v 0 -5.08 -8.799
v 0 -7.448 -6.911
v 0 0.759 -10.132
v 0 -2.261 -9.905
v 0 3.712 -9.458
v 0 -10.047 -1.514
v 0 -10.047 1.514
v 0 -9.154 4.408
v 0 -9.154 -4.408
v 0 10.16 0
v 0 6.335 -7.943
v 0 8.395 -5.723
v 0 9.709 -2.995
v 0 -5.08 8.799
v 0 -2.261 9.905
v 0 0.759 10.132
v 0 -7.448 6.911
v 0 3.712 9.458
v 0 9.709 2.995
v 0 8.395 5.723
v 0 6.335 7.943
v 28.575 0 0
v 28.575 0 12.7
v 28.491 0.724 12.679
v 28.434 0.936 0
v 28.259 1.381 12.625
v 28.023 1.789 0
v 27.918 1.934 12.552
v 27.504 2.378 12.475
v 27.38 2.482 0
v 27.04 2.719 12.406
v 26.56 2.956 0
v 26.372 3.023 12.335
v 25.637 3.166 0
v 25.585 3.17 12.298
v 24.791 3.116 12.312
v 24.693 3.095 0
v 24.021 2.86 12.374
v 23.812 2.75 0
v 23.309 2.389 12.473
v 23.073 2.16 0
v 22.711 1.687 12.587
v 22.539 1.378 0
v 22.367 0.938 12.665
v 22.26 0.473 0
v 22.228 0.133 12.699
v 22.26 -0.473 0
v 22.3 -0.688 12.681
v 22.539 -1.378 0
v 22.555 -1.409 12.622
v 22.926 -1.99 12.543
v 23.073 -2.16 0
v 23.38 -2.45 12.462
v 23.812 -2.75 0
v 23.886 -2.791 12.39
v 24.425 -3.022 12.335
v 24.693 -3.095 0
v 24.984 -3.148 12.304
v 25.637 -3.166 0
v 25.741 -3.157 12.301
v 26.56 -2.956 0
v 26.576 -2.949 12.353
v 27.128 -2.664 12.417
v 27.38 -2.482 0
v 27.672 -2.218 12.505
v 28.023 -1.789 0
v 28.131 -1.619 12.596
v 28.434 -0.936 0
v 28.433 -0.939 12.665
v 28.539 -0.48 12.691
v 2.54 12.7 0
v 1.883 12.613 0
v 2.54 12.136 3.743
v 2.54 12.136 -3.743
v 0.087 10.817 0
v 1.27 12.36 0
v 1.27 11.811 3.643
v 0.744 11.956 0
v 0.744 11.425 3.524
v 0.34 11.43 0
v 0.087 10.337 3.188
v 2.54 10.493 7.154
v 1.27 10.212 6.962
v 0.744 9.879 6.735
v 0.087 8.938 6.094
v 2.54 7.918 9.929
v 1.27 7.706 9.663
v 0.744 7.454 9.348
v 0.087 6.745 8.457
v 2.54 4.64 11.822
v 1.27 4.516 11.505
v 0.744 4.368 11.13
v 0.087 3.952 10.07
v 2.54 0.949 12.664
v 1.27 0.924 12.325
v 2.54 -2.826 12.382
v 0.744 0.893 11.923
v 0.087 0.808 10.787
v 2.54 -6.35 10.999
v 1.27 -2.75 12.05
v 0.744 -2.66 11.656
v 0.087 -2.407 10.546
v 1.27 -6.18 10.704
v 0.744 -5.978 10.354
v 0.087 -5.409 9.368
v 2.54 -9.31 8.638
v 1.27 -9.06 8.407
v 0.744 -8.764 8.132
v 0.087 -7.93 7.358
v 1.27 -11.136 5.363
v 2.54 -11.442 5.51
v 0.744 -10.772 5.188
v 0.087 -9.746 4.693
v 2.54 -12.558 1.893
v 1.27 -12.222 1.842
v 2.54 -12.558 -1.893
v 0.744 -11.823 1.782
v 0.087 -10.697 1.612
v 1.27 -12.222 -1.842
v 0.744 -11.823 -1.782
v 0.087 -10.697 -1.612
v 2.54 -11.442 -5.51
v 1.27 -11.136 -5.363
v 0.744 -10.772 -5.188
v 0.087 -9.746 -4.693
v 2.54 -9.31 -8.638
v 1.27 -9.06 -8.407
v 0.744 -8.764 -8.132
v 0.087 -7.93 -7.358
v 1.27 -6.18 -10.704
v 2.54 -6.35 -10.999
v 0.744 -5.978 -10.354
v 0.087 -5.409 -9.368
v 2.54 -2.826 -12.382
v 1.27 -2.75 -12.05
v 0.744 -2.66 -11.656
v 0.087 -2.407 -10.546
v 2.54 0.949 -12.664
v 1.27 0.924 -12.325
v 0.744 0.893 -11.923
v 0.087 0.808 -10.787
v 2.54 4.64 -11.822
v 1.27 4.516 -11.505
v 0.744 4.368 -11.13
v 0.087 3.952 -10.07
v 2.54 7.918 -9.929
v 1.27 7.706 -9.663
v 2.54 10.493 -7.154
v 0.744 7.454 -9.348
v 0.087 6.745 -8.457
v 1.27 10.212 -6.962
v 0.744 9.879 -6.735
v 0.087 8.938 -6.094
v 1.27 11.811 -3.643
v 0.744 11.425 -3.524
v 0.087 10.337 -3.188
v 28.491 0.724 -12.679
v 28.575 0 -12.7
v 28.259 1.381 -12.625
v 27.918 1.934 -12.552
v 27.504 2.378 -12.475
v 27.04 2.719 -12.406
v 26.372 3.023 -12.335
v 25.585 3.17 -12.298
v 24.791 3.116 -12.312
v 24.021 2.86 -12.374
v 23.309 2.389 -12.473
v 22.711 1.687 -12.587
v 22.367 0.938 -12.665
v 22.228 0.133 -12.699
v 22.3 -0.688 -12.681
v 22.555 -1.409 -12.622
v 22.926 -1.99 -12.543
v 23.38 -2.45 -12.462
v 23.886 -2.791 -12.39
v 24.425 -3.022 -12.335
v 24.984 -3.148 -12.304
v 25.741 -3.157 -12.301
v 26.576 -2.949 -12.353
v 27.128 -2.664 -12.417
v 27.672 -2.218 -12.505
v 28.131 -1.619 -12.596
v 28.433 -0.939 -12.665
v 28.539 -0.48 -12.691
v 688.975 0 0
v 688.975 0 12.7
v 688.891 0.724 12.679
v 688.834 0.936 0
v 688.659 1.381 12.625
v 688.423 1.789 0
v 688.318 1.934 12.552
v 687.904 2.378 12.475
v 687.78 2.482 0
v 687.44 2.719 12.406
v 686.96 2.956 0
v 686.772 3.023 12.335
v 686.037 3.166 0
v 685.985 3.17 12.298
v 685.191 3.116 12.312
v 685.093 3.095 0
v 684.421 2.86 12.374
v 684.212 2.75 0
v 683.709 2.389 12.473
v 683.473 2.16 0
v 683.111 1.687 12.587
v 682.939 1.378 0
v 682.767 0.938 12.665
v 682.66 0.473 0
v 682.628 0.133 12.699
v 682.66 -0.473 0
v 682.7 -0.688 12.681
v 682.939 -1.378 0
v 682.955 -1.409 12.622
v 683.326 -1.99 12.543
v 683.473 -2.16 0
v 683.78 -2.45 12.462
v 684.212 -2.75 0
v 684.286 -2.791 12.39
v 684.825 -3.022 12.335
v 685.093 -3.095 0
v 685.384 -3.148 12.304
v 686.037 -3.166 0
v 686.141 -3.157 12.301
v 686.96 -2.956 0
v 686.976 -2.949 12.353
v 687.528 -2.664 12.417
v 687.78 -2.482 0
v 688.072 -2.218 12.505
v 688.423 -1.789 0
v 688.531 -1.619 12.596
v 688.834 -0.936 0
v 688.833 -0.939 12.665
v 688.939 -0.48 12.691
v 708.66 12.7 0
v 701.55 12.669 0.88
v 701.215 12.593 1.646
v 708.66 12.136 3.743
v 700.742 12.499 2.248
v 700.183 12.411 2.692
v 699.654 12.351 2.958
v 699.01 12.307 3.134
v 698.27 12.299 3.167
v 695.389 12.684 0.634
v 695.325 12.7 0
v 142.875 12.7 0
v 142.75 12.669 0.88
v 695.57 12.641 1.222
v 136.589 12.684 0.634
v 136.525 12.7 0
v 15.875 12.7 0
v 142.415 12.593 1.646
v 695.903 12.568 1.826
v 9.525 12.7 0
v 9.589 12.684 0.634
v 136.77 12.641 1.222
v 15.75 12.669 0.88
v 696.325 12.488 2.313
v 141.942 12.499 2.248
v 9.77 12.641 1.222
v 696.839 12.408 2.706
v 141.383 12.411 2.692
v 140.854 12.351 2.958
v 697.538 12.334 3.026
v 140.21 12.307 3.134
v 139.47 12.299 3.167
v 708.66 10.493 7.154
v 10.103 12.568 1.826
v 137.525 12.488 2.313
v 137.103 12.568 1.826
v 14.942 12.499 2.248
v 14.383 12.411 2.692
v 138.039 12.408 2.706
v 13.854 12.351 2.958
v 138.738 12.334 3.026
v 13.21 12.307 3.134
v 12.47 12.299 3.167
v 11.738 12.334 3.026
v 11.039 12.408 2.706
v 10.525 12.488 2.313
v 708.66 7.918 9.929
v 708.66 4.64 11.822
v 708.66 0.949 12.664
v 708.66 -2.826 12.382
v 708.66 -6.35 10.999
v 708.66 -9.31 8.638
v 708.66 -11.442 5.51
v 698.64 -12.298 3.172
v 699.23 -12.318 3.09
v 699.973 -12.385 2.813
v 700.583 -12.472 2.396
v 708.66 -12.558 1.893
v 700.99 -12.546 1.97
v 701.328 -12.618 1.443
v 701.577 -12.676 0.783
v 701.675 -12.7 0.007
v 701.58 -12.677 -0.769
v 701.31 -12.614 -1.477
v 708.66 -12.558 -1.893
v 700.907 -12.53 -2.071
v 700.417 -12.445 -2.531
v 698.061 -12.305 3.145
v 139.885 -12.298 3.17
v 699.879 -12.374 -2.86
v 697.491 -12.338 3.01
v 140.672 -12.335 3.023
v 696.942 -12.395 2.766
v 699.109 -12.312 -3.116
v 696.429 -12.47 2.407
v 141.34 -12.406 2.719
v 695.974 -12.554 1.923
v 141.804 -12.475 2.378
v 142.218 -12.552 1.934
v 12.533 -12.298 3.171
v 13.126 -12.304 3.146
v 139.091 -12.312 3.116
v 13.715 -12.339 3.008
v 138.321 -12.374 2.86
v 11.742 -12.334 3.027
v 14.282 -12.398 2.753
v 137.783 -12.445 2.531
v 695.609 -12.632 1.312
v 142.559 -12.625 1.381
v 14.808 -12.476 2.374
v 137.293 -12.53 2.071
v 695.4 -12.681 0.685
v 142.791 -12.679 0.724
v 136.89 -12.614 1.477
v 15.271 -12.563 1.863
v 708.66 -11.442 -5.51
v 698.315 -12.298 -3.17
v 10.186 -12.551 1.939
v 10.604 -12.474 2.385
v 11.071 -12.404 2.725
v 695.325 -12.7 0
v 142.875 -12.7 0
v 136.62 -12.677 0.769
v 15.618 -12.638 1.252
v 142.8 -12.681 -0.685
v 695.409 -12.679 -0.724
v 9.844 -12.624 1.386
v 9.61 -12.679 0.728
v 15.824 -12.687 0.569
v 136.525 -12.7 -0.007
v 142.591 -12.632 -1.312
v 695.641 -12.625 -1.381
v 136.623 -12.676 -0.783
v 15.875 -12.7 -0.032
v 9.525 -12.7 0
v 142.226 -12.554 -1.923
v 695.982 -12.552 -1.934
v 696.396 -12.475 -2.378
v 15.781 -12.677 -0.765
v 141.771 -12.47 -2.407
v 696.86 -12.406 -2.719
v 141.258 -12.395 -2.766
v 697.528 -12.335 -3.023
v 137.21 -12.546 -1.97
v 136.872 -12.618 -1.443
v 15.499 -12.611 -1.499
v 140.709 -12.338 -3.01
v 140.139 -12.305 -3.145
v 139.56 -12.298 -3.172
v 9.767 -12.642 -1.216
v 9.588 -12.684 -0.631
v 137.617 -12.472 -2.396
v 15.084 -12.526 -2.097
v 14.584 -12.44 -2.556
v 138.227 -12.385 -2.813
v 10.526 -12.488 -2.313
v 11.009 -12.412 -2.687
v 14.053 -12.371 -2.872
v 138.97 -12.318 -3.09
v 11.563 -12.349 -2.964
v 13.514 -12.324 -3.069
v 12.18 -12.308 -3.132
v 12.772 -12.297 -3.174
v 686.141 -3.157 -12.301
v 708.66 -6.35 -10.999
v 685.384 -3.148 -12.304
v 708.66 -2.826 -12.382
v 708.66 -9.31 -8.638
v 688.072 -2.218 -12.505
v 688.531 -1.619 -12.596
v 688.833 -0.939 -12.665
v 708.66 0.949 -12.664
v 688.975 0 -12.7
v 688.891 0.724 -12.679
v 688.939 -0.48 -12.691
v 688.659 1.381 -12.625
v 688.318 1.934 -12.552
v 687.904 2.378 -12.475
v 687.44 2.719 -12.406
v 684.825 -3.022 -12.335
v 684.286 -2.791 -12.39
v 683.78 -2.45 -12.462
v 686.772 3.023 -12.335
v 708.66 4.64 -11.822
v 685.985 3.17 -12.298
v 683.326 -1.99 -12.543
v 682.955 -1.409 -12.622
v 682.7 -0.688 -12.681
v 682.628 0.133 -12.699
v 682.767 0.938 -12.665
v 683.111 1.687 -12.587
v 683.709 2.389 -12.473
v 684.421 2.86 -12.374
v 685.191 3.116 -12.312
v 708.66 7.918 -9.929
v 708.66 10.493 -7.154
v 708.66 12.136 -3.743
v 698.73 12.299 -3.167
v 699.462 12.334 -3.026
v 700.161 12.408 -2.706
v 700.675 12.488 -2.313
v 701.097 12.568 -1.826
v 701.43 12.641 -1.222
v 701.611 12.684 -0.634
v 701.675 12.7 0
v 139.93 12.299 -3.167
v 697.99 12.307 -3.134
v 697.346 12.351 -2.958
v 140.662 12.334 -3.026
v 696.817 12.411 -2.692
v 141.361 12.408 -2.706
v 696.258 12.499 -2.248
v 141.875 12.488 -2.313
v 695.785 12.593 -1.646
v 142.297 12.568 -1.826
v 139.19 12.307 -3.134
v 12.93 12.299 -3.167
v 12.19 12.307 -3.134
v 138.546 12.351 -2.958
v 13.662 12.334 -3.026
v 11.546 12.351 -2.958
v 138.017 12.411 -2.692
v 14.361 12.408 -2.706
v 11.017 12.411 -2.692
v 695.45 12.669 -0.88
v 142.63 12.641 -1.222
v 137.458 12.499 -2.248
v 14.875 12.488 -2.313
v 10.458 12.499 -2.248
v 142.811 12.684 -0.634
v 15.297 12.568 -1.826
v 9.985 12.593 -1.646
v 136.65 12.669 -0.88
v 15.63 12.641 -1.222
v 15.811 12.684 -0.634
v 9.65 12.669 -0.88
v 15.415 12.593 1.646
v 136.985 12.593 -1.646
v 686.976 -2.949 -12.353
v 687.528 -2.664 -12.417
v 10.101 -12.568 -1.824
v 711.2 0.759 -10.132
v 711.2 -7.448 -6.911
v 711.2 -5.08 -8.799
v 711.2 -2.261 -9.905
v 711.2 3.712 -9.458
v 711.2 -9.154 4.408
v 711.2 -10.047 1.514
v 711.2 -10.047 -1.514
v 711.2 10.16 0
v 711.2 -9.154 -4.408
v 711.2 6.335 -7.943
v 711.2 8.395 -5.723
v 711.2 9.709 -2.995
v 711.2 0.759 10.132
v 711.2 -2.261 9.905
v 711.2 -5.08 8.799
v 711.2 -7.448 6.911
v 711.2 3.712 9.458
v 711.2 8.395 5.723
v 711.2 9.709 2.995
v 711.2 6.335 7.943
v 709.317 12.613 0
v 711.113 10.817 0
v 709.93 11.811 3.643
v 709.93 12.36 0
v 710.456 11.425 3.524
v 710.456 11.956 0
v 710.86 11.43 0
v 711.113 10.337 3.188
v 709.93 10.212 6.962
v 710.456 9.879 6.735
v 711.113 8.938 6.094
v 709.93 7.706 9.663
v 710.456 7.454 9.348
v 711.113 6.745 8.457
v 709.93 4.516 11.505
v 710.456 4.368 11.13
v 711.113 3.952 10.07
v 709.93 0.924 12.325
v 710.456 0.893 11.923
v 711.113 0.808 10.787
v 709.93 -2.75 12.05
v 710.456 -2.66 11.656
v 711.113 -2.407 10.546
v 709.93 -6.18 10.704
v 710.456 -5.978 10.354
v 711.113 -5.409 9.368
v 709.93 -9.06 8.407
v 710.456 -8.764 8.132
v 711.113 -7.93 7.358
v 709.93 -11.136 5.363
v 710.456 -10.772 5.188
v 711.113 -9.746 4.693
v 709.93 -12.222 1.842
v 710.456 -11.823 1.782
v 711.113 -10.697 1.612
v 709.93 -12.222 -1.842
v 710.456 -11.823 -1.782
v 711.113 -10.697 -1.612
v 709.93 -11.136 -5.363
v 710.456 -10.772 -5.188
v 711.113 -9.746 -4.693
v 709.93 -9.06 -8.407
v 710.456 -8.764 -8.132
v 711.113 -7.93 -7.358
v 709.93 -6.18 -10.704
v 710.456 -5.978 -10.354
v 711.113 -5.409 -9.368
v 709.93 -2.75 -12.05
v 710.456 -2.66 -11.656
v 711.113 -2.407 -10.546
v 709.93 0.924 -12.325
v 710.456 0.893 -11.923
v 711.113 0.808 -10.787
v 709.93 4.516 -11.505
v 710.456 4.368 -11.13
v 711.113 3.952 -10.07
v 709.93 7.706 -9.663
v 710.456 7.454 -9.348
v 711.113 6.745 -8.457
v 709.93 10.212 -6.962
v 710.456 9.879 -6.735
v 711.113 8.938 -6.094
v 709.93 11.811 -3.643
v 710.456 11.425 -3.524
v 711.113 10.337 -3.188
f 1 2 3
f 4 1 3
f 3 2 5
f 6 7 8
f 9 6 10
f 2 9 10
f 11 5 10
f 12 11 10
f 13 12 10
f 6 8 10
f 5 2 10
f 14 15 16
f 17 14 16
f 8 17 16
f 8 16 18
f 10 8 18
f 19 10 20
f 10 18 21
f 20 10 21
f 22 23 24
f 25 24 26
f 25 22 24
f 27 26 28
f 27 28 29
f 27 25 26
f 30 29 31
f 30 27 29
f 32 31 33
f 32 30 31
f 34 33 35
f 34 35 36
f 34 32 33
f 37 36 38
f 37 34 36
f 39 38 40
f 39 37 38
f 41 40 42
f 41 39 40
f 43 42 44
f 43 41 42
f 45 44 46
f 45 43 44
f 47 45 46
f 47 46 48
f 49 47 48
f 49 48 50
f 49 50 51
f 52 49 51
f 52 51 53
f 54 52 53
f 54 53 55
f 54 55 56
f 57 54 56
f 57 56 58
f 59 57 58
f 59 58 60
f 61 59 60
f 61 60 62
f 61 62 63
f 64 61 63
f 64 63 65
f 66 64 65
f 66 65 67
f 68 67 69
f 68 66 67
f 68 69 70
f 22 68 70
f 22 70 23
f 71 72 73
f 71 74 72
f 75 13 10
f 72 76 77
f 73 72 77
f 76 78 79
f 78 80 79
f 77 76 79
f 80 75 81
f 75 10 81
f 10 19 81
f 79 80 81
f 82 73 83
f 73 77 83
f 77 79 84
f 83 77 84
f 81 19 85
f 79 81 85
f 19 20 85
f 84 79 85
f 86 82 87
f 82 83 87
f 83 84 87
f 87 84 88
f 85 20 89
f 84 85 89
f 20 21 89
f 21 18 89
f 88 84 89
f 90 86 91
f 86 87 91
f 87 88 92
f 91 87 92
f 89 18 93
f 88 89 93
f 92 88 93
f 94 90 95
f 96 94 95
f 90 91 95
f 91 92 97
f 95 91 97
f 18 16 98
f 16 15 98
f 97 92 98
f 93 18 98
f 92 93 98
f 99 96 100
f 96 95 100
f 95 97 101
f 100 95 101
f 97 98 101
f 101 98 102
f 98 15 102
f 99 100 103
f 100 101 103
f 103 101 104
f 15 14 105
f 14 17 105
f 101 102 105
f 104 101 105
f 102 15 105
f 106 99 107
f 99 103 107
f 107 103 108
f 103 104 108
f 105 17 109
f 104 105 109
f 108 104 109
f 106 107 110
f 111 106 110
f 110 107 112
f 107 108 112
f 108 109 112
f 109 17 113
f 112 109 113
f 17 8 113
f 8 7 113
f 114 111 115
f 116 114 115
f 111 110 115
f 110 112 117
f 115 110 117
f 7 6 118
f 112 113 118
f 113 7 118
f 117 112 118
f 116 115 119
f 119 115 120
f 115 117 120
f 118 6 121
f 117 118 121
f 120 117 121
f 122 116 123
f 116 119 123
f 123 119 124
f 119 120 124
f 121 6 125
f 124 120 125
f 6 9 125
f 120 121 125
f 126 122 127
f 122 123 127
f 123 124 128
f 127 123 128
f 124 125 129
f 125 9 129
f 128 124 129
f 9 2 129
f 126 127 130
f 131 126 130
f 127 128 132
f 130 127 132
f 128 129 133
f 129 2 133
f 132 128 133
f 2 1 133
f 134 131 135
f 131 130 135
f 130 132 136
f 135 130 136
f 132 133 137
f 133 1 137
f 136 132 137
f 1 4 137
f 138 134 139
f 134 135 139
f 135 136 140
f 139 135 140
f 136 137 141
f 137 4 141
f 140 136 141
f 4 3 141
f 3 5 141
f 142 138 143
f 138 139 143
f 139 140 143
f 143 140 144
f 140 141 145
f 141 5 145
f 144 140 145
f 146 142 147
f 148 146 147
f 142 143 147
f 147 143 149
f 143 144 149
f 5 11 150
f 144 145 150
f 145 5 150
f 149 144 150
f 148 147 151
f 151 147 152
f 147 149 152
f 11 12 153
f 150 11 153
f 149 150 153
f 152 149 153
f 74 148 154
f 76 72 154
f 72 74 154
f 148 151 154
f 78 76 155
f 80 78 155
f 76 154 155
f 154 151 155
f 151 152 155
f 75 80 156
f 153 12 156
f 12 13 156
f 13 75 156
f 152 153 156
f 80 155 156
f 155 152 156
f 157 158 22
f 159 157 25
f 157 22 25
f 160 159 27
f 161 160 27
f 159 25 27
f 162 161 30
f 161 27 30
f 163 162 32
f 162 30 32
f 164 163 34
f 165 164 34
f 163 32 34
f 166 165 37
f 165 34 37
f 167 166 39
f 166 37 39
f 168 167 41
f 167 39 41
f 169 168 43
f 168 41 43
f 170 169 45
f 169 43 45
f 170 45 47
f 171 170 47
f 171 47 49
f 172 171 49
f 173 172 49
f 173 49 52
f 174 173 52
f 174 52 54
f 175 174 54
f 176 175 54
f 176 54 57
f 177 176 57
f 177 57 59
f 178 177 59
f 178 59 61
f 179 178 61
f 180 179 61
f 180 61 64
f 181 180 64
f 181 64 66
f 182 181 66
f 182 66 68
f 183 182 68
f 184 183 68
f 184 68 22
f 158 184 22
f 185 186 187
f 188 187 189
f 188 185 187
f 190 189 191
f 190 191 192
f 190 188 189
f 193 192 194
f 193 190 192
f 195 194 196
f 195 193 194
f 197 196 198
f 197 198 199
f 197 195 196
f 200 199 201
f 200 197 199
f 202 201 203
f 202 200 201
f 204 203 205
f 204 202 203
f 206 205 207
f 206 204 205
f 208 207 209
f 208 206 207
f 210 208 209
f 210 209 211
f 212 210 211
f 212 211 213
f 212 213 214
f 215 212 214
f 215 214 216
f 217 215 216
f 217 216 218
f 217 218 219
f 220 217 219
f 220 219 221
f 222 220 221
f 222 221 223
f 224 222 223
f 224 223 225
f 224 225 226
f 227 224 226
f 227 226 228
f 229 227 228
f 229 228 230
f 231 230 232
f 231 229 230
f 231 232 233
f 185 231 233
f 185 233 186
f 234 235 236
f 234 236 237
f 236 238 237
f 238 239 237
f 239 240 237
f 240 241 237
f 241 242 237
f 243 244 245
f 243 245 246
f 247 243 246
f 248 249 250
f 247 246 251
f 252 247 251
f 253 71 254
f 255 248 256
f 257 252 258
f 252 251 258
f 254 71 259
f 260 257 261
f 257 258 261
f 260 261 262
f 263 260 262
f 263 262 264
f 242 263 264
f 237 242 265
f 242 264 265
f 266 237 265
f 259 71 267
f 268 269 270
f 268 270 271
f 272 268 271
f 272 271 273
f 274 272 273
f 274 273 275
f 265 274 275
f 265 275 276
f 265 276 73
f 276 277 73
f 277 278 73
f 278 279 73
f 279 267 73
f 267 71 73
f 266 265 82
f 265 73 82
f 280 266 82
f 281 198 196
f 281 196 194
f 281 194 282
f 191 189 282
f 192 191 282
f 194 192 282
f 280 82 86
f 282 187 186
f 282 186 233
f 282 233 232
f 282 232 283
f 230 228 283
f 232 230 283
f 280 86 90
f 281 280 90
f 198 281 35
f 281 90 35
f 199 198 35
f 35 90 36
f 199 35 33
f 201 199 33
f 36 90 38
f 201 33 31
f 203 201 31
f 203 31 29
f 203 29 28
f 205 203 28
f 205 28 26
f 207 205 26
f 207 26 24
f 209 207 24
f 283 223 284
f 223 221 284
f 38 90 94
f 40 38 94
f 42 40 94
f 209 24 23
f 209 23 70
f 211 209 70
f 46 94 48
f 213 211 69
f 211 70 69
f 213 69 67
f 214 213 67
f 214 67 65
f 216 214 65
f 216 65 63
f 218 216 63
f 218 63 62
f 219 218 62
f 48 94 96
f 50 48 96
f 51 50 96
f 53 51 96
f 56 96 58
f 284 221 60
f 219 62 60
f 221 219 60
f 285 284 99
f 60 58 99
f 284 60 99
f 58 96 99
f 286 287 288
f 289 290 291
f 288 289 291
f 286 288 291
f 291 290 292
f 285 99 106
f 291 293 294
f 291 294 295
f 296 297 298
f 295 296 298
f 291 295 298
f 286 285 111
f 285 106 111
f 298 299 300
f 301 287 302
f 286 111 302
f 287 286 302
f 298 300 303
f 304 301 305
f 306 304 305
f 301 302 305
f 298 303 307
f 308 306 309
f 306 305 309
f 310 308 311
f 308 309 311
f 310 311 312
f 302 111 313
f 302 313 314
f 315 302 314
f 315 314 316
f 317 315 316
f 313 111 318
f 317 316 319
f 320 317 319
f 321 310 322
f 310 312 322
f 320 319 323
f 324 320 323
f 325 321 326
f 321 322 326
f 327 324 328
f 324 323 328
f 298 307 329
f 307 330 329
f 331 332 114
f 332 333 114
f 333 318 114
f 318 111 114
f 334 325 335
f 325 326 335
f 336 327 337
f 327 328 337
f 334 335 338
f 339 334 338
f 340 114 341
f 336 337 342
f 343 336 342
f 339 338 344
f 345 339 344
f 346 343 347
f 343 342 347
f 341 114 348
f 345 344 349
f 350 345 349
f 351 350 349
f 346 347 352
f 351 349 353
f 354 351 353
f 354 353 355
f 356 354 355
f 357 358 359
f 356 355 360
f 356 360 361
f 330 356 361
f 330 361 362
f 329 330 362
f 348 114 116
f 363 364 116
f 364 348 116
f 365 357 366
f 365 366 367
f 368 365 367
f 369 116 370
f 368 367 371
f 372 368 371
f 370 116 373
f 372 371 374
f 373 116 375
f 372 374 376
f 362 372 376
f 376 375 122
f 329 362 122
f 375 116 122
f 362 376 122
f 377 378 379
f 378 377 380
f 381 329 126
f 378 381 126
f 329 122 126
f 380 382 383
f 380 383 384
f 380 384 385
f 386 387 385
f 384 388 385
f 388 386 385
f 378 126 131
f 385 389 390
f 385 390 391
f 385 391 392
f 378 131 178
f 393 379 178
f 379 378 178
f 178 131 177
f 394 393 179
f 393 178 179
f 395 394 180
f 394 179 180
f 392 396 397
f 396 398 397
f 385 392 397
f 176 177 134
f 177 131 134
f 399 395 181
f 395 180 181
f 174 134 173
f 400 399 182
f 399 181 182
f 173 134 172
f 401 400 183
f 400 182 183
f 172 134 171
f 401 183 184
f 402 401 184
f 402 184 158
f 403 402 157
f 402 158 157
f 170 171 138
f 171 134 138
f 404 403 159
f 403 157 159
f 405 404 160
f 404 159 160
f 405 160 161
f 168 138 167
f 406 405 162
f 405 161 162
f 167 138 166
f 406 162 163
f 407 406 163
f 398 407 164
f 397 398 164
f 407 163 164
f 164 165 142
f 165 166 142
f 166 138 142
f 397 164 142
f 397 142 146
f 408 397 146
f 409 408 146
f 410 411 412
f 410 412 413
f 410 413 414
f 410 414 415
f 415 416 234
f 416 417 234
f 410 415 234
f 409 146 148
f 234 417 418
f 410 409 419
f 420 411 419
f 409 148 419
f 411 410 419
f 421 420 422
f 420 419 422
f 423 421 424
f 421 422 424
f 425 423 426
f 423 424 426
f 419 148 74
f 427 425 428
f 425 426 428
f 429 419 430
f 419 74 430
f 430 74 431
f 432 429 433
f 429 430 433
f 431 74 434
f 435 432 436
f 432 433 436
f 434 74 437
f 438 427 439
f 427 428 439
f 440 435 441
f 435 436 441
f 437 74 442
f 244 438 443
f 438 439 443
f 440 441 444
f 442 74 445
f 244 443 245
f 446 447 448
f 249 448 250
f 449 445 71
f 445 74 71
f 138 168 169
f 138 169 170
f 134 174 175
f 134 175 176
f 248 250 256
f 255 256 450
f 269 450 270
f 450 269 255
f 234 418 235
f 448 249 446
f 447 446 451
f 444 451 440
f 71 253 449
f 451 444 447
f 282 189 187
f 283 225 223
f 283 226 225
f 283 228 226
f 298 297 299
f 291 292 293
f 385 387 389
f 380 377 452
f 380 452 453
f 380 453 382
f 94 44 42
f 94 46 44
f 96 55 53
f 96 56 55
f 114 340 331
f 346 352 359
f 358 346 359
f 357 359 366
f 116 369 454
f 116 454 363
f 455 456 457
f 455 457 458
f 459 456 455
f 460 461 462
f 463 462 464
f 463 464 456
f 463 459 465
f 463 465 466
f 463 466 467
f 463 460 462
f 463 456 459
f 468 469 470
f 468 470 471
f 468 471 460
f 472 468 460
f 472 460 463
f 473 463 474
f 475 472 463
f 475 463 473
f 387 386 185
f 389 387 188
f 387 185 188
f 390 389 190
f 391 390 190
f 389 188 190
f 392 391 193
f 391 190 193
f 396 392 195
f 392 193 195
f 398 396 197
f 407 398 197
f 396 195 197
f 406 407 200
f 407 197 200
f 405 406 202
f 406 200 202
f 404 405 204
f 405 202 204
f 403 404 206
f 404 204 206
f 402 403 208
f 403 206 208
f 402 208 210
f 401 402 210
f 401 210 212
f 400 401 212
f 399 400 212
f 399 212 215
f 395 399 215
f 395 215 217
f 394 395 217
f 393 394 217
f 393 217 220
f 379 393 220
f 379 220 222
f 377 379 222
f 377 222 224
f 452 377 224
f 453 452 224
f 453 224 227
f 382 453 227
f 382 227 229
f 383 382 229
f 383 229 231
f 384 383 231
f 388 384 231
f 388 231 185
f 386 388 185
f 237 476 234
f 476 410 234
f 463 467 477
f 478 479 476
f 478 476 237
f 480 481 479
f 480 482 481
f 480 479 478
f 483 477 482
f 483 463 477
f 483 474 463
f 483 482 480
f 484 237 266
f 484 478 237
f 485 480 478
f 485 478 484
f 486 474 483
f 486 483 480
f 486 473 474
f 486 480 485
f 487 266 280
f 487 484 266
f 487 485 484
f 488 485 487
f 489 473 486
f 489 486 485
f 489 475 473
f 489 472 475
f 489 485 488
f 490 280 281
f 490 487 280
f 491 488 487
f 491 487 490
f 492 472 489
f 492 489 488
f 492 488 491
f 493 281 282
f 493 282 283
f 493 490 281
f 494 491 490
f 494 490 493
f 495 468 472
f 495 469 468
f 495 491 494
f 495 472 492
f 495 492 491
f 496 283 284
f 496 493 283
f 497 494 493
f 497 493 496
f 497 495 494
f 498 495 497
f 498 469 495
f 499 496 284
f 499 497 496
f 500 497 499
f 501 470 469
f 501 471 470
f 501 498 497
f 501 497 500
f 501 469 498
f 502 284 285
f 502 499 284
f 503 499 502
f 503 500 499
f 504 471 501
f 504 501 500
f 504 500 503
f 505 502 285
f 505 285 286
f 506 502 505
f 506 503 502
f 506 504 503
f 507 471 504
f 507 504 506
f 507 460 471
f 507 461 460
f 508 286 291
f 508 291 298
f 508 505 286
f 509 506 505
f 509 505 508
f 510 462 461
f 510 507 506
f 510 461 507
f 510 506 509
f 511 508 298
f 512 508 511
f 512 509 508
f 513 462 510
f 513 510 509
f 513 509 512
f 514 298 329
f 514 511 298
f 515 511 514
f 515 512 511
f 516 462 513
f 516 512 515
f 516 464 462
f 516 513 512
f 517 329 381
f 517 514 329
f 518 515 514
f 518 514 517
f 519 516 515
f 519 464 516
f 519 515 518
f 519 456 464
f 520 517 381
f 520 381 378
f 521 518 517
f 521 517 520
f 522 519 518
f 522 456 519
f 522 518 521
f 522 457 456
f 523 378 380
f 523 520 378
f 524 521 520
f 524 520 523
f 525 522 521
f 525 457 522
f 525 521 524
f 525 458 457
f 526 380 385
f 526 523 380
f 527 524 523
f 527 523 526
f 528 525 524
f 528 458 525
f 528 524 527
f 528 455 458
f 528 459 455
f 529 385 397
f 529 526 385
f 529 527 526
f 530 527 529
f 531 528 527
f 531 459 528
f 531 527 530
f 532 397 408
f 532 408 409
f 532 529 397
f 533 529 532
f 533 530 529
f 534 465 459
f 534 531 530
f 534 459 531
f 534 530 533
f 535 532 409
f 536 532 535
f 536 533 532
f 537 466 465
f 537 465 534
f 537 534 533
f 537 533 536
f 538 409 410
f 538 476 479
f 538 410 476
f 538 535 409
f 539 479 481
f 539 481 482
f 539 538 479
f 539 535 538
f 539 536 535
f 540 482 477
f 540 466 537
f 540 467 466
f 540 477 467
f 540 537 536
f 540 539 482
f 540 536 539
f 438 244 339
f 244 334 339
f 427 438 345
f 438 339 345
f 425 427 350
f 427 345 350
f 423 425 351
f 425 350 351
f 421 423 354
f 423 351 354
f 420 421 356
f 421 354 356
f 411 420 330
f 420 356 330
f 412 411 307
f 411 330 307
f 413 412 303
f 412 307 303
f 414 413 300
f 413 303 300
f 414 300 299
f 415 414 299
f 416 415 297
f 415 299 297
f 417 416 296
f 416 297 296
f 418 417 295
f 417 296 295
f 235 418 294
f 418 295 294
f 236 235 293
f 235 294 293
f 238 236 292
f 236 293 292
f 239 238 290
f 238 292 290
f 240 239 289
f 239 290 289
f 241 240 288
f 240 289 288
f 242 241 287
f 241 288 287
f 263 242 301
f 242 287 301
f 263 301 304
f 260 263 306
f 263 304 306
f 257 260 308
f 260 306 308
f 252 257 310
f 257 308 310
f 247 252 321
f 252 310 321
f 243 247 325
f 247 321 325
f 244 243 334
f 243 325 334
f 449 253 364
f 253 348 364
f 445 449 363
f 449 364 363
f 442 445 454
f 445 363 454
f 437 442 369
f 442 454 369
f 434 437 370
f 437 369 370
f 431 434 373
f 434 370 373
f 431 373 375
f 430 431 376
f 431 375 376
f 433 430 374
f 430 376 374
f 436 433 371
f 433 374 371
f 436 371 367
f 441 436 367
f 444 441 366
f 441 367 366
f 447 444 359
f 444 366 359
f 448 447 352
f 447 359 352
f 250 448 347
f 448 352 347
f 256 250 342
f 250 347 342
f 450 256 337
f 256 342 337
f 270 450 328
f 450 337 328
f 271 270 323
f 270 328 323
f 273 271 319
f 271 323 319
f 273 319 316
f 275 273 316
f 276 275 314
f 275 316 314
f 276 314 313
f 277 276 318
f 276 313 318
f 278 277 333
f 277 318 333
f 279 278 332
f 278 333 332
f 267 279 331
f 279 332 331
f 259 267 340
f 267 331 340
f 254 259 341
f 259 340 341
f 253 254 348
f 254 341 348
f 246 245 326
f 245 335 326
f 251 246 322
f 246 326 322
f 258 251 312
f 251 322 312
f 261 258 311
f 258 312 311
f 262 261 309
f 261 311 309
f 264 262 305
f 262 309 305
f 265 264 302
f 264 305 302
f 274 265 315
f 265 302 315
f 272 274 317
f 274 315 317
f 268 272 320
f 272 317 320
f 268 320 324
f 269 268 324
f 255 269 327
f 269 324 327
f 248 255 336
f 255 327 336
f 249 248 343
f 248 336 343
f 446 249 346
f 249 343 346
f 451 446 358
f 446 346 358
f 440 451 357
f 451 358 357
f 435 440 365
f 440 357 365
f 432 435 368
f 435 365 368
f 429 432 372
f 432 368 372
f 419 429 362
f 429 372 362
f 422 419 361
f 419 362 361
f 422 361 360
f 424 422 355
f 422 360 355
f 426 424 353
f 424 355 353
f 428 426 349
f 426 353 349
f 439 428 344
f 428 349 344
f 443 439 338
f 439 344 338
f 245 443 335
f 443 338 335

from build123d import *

# Parameters (mm, degrees)
F0_R           = 12.7
F1_DEPTH       = 711.2
F3_DEPTH       = 19.05
F4_R           = 2.54
F7_DEPTH       = 45.72
F7_DEPTH_BACK  = 25.4
F9_DEPTH       = 25.4
F9_DEPTH_BACK  = 25.4
F10_R          = 3.175
F11_DEPTH      = 25.4
F11_DEPTH_BACK = 25.4


with BuildPart() as f1:
    # F0 (on Right) → F1 (new body)
    with BuildSketch(Plane.YZ):
        Circle(F0_R)
    extrude(amount=F1_DEPTH)

    # F2 (on Front) → F3 (join)
    with BuildSketch(Plane.XZ):
        with BuildLine():
            ThreePointArc((9.525, 0), (12.7, -3.175), (15.875, 0))
            ThreePointArc((15.875, 0), (12.7, 3.175), (9.525, 0))
        make_face()
    extrude(amount=F3_DEPTH)

    # F4
    f4_edges = [f1.edges().sort_by_distance(p)[0] for p in [
        (0, -12.7, 0),
        (711.2, -12.7, 0),
    ]]
    fillet(f4_edges, radius=F4_R)

    # F6 (on offset) → F7 (cut, two sides)
    with BuildSketch(Plane.XZ.offset(-6.35)) as f7_sk:
        with BuildLine():
            ThreePointArc((15.875, 0), (12.7, 3.175), (9.525, 0))
            Line((9.525, 0), (12.7, 0))
            Line((12.7, 0), (15.875, 0))
        make_face()
        with BuildLine():
            ThreePointArc((701.675, 0), (698.5, 3.175), (695.325, 0))
            ThreePointArc((695.325, 0), (698.5, -3.175), (701.675, 0))
        make_face()
        with BuildLine():
            Line((12.7, 0), (9.525, 0))
            ThreePointArc((9.525, 0), (12.7, -3.175), (15.875, 0))
            Line((15.875, 0), (12.7, 0))
        make_face()
    extrude(amount=-F7_DEPTH, mode=Mode.SUBTRACT)
    extrude(f7_sk.sketch, amount=F7_DEPTH_BACK, mode=Mode.SUBTRACT)

    # F8 (on Front) → F9 (cut, two sides)
    with BuildSketch(Plane.XZ) as f9_sk:
        with BuildLine():
            ThreePointArc((136.525, 0), (139.7, -3.175), (142.875, 0))
            ThreePointArc((142.875, 0), (139.7, 3.175), (136.525, 0))
        make_face()
    extrude(amount=-F9_DEPTH, mode=Mode.SUBTRACT)
    extrude(f9_sk.sketch, amount=F9_DEPTH_BACK, mode=Mode.SUBTRACT)

    # F10 (on Top) → F11 (cut, two sides)
    with BuildSketch(Plane.XY) as f11_sk:
        with BuildLine():
            ThreePointArc((22.225, 0), (25.4, -3.175), (28.575, 0))
            ThreePointArc((28.575, 0), (25.4, 3.175), (22.225, 0))
        make_face()
        with Locations((685.8, 0)):
            Circle(F10_R)
    extrude(amount=-F11_DEPTH, mode=Mode.SUBTRACT)
    extrude(f11_sk.sketch, amount=F11_DEPTH_BACK, mode=Mode.SUBTRACT)


solid = f1.part
